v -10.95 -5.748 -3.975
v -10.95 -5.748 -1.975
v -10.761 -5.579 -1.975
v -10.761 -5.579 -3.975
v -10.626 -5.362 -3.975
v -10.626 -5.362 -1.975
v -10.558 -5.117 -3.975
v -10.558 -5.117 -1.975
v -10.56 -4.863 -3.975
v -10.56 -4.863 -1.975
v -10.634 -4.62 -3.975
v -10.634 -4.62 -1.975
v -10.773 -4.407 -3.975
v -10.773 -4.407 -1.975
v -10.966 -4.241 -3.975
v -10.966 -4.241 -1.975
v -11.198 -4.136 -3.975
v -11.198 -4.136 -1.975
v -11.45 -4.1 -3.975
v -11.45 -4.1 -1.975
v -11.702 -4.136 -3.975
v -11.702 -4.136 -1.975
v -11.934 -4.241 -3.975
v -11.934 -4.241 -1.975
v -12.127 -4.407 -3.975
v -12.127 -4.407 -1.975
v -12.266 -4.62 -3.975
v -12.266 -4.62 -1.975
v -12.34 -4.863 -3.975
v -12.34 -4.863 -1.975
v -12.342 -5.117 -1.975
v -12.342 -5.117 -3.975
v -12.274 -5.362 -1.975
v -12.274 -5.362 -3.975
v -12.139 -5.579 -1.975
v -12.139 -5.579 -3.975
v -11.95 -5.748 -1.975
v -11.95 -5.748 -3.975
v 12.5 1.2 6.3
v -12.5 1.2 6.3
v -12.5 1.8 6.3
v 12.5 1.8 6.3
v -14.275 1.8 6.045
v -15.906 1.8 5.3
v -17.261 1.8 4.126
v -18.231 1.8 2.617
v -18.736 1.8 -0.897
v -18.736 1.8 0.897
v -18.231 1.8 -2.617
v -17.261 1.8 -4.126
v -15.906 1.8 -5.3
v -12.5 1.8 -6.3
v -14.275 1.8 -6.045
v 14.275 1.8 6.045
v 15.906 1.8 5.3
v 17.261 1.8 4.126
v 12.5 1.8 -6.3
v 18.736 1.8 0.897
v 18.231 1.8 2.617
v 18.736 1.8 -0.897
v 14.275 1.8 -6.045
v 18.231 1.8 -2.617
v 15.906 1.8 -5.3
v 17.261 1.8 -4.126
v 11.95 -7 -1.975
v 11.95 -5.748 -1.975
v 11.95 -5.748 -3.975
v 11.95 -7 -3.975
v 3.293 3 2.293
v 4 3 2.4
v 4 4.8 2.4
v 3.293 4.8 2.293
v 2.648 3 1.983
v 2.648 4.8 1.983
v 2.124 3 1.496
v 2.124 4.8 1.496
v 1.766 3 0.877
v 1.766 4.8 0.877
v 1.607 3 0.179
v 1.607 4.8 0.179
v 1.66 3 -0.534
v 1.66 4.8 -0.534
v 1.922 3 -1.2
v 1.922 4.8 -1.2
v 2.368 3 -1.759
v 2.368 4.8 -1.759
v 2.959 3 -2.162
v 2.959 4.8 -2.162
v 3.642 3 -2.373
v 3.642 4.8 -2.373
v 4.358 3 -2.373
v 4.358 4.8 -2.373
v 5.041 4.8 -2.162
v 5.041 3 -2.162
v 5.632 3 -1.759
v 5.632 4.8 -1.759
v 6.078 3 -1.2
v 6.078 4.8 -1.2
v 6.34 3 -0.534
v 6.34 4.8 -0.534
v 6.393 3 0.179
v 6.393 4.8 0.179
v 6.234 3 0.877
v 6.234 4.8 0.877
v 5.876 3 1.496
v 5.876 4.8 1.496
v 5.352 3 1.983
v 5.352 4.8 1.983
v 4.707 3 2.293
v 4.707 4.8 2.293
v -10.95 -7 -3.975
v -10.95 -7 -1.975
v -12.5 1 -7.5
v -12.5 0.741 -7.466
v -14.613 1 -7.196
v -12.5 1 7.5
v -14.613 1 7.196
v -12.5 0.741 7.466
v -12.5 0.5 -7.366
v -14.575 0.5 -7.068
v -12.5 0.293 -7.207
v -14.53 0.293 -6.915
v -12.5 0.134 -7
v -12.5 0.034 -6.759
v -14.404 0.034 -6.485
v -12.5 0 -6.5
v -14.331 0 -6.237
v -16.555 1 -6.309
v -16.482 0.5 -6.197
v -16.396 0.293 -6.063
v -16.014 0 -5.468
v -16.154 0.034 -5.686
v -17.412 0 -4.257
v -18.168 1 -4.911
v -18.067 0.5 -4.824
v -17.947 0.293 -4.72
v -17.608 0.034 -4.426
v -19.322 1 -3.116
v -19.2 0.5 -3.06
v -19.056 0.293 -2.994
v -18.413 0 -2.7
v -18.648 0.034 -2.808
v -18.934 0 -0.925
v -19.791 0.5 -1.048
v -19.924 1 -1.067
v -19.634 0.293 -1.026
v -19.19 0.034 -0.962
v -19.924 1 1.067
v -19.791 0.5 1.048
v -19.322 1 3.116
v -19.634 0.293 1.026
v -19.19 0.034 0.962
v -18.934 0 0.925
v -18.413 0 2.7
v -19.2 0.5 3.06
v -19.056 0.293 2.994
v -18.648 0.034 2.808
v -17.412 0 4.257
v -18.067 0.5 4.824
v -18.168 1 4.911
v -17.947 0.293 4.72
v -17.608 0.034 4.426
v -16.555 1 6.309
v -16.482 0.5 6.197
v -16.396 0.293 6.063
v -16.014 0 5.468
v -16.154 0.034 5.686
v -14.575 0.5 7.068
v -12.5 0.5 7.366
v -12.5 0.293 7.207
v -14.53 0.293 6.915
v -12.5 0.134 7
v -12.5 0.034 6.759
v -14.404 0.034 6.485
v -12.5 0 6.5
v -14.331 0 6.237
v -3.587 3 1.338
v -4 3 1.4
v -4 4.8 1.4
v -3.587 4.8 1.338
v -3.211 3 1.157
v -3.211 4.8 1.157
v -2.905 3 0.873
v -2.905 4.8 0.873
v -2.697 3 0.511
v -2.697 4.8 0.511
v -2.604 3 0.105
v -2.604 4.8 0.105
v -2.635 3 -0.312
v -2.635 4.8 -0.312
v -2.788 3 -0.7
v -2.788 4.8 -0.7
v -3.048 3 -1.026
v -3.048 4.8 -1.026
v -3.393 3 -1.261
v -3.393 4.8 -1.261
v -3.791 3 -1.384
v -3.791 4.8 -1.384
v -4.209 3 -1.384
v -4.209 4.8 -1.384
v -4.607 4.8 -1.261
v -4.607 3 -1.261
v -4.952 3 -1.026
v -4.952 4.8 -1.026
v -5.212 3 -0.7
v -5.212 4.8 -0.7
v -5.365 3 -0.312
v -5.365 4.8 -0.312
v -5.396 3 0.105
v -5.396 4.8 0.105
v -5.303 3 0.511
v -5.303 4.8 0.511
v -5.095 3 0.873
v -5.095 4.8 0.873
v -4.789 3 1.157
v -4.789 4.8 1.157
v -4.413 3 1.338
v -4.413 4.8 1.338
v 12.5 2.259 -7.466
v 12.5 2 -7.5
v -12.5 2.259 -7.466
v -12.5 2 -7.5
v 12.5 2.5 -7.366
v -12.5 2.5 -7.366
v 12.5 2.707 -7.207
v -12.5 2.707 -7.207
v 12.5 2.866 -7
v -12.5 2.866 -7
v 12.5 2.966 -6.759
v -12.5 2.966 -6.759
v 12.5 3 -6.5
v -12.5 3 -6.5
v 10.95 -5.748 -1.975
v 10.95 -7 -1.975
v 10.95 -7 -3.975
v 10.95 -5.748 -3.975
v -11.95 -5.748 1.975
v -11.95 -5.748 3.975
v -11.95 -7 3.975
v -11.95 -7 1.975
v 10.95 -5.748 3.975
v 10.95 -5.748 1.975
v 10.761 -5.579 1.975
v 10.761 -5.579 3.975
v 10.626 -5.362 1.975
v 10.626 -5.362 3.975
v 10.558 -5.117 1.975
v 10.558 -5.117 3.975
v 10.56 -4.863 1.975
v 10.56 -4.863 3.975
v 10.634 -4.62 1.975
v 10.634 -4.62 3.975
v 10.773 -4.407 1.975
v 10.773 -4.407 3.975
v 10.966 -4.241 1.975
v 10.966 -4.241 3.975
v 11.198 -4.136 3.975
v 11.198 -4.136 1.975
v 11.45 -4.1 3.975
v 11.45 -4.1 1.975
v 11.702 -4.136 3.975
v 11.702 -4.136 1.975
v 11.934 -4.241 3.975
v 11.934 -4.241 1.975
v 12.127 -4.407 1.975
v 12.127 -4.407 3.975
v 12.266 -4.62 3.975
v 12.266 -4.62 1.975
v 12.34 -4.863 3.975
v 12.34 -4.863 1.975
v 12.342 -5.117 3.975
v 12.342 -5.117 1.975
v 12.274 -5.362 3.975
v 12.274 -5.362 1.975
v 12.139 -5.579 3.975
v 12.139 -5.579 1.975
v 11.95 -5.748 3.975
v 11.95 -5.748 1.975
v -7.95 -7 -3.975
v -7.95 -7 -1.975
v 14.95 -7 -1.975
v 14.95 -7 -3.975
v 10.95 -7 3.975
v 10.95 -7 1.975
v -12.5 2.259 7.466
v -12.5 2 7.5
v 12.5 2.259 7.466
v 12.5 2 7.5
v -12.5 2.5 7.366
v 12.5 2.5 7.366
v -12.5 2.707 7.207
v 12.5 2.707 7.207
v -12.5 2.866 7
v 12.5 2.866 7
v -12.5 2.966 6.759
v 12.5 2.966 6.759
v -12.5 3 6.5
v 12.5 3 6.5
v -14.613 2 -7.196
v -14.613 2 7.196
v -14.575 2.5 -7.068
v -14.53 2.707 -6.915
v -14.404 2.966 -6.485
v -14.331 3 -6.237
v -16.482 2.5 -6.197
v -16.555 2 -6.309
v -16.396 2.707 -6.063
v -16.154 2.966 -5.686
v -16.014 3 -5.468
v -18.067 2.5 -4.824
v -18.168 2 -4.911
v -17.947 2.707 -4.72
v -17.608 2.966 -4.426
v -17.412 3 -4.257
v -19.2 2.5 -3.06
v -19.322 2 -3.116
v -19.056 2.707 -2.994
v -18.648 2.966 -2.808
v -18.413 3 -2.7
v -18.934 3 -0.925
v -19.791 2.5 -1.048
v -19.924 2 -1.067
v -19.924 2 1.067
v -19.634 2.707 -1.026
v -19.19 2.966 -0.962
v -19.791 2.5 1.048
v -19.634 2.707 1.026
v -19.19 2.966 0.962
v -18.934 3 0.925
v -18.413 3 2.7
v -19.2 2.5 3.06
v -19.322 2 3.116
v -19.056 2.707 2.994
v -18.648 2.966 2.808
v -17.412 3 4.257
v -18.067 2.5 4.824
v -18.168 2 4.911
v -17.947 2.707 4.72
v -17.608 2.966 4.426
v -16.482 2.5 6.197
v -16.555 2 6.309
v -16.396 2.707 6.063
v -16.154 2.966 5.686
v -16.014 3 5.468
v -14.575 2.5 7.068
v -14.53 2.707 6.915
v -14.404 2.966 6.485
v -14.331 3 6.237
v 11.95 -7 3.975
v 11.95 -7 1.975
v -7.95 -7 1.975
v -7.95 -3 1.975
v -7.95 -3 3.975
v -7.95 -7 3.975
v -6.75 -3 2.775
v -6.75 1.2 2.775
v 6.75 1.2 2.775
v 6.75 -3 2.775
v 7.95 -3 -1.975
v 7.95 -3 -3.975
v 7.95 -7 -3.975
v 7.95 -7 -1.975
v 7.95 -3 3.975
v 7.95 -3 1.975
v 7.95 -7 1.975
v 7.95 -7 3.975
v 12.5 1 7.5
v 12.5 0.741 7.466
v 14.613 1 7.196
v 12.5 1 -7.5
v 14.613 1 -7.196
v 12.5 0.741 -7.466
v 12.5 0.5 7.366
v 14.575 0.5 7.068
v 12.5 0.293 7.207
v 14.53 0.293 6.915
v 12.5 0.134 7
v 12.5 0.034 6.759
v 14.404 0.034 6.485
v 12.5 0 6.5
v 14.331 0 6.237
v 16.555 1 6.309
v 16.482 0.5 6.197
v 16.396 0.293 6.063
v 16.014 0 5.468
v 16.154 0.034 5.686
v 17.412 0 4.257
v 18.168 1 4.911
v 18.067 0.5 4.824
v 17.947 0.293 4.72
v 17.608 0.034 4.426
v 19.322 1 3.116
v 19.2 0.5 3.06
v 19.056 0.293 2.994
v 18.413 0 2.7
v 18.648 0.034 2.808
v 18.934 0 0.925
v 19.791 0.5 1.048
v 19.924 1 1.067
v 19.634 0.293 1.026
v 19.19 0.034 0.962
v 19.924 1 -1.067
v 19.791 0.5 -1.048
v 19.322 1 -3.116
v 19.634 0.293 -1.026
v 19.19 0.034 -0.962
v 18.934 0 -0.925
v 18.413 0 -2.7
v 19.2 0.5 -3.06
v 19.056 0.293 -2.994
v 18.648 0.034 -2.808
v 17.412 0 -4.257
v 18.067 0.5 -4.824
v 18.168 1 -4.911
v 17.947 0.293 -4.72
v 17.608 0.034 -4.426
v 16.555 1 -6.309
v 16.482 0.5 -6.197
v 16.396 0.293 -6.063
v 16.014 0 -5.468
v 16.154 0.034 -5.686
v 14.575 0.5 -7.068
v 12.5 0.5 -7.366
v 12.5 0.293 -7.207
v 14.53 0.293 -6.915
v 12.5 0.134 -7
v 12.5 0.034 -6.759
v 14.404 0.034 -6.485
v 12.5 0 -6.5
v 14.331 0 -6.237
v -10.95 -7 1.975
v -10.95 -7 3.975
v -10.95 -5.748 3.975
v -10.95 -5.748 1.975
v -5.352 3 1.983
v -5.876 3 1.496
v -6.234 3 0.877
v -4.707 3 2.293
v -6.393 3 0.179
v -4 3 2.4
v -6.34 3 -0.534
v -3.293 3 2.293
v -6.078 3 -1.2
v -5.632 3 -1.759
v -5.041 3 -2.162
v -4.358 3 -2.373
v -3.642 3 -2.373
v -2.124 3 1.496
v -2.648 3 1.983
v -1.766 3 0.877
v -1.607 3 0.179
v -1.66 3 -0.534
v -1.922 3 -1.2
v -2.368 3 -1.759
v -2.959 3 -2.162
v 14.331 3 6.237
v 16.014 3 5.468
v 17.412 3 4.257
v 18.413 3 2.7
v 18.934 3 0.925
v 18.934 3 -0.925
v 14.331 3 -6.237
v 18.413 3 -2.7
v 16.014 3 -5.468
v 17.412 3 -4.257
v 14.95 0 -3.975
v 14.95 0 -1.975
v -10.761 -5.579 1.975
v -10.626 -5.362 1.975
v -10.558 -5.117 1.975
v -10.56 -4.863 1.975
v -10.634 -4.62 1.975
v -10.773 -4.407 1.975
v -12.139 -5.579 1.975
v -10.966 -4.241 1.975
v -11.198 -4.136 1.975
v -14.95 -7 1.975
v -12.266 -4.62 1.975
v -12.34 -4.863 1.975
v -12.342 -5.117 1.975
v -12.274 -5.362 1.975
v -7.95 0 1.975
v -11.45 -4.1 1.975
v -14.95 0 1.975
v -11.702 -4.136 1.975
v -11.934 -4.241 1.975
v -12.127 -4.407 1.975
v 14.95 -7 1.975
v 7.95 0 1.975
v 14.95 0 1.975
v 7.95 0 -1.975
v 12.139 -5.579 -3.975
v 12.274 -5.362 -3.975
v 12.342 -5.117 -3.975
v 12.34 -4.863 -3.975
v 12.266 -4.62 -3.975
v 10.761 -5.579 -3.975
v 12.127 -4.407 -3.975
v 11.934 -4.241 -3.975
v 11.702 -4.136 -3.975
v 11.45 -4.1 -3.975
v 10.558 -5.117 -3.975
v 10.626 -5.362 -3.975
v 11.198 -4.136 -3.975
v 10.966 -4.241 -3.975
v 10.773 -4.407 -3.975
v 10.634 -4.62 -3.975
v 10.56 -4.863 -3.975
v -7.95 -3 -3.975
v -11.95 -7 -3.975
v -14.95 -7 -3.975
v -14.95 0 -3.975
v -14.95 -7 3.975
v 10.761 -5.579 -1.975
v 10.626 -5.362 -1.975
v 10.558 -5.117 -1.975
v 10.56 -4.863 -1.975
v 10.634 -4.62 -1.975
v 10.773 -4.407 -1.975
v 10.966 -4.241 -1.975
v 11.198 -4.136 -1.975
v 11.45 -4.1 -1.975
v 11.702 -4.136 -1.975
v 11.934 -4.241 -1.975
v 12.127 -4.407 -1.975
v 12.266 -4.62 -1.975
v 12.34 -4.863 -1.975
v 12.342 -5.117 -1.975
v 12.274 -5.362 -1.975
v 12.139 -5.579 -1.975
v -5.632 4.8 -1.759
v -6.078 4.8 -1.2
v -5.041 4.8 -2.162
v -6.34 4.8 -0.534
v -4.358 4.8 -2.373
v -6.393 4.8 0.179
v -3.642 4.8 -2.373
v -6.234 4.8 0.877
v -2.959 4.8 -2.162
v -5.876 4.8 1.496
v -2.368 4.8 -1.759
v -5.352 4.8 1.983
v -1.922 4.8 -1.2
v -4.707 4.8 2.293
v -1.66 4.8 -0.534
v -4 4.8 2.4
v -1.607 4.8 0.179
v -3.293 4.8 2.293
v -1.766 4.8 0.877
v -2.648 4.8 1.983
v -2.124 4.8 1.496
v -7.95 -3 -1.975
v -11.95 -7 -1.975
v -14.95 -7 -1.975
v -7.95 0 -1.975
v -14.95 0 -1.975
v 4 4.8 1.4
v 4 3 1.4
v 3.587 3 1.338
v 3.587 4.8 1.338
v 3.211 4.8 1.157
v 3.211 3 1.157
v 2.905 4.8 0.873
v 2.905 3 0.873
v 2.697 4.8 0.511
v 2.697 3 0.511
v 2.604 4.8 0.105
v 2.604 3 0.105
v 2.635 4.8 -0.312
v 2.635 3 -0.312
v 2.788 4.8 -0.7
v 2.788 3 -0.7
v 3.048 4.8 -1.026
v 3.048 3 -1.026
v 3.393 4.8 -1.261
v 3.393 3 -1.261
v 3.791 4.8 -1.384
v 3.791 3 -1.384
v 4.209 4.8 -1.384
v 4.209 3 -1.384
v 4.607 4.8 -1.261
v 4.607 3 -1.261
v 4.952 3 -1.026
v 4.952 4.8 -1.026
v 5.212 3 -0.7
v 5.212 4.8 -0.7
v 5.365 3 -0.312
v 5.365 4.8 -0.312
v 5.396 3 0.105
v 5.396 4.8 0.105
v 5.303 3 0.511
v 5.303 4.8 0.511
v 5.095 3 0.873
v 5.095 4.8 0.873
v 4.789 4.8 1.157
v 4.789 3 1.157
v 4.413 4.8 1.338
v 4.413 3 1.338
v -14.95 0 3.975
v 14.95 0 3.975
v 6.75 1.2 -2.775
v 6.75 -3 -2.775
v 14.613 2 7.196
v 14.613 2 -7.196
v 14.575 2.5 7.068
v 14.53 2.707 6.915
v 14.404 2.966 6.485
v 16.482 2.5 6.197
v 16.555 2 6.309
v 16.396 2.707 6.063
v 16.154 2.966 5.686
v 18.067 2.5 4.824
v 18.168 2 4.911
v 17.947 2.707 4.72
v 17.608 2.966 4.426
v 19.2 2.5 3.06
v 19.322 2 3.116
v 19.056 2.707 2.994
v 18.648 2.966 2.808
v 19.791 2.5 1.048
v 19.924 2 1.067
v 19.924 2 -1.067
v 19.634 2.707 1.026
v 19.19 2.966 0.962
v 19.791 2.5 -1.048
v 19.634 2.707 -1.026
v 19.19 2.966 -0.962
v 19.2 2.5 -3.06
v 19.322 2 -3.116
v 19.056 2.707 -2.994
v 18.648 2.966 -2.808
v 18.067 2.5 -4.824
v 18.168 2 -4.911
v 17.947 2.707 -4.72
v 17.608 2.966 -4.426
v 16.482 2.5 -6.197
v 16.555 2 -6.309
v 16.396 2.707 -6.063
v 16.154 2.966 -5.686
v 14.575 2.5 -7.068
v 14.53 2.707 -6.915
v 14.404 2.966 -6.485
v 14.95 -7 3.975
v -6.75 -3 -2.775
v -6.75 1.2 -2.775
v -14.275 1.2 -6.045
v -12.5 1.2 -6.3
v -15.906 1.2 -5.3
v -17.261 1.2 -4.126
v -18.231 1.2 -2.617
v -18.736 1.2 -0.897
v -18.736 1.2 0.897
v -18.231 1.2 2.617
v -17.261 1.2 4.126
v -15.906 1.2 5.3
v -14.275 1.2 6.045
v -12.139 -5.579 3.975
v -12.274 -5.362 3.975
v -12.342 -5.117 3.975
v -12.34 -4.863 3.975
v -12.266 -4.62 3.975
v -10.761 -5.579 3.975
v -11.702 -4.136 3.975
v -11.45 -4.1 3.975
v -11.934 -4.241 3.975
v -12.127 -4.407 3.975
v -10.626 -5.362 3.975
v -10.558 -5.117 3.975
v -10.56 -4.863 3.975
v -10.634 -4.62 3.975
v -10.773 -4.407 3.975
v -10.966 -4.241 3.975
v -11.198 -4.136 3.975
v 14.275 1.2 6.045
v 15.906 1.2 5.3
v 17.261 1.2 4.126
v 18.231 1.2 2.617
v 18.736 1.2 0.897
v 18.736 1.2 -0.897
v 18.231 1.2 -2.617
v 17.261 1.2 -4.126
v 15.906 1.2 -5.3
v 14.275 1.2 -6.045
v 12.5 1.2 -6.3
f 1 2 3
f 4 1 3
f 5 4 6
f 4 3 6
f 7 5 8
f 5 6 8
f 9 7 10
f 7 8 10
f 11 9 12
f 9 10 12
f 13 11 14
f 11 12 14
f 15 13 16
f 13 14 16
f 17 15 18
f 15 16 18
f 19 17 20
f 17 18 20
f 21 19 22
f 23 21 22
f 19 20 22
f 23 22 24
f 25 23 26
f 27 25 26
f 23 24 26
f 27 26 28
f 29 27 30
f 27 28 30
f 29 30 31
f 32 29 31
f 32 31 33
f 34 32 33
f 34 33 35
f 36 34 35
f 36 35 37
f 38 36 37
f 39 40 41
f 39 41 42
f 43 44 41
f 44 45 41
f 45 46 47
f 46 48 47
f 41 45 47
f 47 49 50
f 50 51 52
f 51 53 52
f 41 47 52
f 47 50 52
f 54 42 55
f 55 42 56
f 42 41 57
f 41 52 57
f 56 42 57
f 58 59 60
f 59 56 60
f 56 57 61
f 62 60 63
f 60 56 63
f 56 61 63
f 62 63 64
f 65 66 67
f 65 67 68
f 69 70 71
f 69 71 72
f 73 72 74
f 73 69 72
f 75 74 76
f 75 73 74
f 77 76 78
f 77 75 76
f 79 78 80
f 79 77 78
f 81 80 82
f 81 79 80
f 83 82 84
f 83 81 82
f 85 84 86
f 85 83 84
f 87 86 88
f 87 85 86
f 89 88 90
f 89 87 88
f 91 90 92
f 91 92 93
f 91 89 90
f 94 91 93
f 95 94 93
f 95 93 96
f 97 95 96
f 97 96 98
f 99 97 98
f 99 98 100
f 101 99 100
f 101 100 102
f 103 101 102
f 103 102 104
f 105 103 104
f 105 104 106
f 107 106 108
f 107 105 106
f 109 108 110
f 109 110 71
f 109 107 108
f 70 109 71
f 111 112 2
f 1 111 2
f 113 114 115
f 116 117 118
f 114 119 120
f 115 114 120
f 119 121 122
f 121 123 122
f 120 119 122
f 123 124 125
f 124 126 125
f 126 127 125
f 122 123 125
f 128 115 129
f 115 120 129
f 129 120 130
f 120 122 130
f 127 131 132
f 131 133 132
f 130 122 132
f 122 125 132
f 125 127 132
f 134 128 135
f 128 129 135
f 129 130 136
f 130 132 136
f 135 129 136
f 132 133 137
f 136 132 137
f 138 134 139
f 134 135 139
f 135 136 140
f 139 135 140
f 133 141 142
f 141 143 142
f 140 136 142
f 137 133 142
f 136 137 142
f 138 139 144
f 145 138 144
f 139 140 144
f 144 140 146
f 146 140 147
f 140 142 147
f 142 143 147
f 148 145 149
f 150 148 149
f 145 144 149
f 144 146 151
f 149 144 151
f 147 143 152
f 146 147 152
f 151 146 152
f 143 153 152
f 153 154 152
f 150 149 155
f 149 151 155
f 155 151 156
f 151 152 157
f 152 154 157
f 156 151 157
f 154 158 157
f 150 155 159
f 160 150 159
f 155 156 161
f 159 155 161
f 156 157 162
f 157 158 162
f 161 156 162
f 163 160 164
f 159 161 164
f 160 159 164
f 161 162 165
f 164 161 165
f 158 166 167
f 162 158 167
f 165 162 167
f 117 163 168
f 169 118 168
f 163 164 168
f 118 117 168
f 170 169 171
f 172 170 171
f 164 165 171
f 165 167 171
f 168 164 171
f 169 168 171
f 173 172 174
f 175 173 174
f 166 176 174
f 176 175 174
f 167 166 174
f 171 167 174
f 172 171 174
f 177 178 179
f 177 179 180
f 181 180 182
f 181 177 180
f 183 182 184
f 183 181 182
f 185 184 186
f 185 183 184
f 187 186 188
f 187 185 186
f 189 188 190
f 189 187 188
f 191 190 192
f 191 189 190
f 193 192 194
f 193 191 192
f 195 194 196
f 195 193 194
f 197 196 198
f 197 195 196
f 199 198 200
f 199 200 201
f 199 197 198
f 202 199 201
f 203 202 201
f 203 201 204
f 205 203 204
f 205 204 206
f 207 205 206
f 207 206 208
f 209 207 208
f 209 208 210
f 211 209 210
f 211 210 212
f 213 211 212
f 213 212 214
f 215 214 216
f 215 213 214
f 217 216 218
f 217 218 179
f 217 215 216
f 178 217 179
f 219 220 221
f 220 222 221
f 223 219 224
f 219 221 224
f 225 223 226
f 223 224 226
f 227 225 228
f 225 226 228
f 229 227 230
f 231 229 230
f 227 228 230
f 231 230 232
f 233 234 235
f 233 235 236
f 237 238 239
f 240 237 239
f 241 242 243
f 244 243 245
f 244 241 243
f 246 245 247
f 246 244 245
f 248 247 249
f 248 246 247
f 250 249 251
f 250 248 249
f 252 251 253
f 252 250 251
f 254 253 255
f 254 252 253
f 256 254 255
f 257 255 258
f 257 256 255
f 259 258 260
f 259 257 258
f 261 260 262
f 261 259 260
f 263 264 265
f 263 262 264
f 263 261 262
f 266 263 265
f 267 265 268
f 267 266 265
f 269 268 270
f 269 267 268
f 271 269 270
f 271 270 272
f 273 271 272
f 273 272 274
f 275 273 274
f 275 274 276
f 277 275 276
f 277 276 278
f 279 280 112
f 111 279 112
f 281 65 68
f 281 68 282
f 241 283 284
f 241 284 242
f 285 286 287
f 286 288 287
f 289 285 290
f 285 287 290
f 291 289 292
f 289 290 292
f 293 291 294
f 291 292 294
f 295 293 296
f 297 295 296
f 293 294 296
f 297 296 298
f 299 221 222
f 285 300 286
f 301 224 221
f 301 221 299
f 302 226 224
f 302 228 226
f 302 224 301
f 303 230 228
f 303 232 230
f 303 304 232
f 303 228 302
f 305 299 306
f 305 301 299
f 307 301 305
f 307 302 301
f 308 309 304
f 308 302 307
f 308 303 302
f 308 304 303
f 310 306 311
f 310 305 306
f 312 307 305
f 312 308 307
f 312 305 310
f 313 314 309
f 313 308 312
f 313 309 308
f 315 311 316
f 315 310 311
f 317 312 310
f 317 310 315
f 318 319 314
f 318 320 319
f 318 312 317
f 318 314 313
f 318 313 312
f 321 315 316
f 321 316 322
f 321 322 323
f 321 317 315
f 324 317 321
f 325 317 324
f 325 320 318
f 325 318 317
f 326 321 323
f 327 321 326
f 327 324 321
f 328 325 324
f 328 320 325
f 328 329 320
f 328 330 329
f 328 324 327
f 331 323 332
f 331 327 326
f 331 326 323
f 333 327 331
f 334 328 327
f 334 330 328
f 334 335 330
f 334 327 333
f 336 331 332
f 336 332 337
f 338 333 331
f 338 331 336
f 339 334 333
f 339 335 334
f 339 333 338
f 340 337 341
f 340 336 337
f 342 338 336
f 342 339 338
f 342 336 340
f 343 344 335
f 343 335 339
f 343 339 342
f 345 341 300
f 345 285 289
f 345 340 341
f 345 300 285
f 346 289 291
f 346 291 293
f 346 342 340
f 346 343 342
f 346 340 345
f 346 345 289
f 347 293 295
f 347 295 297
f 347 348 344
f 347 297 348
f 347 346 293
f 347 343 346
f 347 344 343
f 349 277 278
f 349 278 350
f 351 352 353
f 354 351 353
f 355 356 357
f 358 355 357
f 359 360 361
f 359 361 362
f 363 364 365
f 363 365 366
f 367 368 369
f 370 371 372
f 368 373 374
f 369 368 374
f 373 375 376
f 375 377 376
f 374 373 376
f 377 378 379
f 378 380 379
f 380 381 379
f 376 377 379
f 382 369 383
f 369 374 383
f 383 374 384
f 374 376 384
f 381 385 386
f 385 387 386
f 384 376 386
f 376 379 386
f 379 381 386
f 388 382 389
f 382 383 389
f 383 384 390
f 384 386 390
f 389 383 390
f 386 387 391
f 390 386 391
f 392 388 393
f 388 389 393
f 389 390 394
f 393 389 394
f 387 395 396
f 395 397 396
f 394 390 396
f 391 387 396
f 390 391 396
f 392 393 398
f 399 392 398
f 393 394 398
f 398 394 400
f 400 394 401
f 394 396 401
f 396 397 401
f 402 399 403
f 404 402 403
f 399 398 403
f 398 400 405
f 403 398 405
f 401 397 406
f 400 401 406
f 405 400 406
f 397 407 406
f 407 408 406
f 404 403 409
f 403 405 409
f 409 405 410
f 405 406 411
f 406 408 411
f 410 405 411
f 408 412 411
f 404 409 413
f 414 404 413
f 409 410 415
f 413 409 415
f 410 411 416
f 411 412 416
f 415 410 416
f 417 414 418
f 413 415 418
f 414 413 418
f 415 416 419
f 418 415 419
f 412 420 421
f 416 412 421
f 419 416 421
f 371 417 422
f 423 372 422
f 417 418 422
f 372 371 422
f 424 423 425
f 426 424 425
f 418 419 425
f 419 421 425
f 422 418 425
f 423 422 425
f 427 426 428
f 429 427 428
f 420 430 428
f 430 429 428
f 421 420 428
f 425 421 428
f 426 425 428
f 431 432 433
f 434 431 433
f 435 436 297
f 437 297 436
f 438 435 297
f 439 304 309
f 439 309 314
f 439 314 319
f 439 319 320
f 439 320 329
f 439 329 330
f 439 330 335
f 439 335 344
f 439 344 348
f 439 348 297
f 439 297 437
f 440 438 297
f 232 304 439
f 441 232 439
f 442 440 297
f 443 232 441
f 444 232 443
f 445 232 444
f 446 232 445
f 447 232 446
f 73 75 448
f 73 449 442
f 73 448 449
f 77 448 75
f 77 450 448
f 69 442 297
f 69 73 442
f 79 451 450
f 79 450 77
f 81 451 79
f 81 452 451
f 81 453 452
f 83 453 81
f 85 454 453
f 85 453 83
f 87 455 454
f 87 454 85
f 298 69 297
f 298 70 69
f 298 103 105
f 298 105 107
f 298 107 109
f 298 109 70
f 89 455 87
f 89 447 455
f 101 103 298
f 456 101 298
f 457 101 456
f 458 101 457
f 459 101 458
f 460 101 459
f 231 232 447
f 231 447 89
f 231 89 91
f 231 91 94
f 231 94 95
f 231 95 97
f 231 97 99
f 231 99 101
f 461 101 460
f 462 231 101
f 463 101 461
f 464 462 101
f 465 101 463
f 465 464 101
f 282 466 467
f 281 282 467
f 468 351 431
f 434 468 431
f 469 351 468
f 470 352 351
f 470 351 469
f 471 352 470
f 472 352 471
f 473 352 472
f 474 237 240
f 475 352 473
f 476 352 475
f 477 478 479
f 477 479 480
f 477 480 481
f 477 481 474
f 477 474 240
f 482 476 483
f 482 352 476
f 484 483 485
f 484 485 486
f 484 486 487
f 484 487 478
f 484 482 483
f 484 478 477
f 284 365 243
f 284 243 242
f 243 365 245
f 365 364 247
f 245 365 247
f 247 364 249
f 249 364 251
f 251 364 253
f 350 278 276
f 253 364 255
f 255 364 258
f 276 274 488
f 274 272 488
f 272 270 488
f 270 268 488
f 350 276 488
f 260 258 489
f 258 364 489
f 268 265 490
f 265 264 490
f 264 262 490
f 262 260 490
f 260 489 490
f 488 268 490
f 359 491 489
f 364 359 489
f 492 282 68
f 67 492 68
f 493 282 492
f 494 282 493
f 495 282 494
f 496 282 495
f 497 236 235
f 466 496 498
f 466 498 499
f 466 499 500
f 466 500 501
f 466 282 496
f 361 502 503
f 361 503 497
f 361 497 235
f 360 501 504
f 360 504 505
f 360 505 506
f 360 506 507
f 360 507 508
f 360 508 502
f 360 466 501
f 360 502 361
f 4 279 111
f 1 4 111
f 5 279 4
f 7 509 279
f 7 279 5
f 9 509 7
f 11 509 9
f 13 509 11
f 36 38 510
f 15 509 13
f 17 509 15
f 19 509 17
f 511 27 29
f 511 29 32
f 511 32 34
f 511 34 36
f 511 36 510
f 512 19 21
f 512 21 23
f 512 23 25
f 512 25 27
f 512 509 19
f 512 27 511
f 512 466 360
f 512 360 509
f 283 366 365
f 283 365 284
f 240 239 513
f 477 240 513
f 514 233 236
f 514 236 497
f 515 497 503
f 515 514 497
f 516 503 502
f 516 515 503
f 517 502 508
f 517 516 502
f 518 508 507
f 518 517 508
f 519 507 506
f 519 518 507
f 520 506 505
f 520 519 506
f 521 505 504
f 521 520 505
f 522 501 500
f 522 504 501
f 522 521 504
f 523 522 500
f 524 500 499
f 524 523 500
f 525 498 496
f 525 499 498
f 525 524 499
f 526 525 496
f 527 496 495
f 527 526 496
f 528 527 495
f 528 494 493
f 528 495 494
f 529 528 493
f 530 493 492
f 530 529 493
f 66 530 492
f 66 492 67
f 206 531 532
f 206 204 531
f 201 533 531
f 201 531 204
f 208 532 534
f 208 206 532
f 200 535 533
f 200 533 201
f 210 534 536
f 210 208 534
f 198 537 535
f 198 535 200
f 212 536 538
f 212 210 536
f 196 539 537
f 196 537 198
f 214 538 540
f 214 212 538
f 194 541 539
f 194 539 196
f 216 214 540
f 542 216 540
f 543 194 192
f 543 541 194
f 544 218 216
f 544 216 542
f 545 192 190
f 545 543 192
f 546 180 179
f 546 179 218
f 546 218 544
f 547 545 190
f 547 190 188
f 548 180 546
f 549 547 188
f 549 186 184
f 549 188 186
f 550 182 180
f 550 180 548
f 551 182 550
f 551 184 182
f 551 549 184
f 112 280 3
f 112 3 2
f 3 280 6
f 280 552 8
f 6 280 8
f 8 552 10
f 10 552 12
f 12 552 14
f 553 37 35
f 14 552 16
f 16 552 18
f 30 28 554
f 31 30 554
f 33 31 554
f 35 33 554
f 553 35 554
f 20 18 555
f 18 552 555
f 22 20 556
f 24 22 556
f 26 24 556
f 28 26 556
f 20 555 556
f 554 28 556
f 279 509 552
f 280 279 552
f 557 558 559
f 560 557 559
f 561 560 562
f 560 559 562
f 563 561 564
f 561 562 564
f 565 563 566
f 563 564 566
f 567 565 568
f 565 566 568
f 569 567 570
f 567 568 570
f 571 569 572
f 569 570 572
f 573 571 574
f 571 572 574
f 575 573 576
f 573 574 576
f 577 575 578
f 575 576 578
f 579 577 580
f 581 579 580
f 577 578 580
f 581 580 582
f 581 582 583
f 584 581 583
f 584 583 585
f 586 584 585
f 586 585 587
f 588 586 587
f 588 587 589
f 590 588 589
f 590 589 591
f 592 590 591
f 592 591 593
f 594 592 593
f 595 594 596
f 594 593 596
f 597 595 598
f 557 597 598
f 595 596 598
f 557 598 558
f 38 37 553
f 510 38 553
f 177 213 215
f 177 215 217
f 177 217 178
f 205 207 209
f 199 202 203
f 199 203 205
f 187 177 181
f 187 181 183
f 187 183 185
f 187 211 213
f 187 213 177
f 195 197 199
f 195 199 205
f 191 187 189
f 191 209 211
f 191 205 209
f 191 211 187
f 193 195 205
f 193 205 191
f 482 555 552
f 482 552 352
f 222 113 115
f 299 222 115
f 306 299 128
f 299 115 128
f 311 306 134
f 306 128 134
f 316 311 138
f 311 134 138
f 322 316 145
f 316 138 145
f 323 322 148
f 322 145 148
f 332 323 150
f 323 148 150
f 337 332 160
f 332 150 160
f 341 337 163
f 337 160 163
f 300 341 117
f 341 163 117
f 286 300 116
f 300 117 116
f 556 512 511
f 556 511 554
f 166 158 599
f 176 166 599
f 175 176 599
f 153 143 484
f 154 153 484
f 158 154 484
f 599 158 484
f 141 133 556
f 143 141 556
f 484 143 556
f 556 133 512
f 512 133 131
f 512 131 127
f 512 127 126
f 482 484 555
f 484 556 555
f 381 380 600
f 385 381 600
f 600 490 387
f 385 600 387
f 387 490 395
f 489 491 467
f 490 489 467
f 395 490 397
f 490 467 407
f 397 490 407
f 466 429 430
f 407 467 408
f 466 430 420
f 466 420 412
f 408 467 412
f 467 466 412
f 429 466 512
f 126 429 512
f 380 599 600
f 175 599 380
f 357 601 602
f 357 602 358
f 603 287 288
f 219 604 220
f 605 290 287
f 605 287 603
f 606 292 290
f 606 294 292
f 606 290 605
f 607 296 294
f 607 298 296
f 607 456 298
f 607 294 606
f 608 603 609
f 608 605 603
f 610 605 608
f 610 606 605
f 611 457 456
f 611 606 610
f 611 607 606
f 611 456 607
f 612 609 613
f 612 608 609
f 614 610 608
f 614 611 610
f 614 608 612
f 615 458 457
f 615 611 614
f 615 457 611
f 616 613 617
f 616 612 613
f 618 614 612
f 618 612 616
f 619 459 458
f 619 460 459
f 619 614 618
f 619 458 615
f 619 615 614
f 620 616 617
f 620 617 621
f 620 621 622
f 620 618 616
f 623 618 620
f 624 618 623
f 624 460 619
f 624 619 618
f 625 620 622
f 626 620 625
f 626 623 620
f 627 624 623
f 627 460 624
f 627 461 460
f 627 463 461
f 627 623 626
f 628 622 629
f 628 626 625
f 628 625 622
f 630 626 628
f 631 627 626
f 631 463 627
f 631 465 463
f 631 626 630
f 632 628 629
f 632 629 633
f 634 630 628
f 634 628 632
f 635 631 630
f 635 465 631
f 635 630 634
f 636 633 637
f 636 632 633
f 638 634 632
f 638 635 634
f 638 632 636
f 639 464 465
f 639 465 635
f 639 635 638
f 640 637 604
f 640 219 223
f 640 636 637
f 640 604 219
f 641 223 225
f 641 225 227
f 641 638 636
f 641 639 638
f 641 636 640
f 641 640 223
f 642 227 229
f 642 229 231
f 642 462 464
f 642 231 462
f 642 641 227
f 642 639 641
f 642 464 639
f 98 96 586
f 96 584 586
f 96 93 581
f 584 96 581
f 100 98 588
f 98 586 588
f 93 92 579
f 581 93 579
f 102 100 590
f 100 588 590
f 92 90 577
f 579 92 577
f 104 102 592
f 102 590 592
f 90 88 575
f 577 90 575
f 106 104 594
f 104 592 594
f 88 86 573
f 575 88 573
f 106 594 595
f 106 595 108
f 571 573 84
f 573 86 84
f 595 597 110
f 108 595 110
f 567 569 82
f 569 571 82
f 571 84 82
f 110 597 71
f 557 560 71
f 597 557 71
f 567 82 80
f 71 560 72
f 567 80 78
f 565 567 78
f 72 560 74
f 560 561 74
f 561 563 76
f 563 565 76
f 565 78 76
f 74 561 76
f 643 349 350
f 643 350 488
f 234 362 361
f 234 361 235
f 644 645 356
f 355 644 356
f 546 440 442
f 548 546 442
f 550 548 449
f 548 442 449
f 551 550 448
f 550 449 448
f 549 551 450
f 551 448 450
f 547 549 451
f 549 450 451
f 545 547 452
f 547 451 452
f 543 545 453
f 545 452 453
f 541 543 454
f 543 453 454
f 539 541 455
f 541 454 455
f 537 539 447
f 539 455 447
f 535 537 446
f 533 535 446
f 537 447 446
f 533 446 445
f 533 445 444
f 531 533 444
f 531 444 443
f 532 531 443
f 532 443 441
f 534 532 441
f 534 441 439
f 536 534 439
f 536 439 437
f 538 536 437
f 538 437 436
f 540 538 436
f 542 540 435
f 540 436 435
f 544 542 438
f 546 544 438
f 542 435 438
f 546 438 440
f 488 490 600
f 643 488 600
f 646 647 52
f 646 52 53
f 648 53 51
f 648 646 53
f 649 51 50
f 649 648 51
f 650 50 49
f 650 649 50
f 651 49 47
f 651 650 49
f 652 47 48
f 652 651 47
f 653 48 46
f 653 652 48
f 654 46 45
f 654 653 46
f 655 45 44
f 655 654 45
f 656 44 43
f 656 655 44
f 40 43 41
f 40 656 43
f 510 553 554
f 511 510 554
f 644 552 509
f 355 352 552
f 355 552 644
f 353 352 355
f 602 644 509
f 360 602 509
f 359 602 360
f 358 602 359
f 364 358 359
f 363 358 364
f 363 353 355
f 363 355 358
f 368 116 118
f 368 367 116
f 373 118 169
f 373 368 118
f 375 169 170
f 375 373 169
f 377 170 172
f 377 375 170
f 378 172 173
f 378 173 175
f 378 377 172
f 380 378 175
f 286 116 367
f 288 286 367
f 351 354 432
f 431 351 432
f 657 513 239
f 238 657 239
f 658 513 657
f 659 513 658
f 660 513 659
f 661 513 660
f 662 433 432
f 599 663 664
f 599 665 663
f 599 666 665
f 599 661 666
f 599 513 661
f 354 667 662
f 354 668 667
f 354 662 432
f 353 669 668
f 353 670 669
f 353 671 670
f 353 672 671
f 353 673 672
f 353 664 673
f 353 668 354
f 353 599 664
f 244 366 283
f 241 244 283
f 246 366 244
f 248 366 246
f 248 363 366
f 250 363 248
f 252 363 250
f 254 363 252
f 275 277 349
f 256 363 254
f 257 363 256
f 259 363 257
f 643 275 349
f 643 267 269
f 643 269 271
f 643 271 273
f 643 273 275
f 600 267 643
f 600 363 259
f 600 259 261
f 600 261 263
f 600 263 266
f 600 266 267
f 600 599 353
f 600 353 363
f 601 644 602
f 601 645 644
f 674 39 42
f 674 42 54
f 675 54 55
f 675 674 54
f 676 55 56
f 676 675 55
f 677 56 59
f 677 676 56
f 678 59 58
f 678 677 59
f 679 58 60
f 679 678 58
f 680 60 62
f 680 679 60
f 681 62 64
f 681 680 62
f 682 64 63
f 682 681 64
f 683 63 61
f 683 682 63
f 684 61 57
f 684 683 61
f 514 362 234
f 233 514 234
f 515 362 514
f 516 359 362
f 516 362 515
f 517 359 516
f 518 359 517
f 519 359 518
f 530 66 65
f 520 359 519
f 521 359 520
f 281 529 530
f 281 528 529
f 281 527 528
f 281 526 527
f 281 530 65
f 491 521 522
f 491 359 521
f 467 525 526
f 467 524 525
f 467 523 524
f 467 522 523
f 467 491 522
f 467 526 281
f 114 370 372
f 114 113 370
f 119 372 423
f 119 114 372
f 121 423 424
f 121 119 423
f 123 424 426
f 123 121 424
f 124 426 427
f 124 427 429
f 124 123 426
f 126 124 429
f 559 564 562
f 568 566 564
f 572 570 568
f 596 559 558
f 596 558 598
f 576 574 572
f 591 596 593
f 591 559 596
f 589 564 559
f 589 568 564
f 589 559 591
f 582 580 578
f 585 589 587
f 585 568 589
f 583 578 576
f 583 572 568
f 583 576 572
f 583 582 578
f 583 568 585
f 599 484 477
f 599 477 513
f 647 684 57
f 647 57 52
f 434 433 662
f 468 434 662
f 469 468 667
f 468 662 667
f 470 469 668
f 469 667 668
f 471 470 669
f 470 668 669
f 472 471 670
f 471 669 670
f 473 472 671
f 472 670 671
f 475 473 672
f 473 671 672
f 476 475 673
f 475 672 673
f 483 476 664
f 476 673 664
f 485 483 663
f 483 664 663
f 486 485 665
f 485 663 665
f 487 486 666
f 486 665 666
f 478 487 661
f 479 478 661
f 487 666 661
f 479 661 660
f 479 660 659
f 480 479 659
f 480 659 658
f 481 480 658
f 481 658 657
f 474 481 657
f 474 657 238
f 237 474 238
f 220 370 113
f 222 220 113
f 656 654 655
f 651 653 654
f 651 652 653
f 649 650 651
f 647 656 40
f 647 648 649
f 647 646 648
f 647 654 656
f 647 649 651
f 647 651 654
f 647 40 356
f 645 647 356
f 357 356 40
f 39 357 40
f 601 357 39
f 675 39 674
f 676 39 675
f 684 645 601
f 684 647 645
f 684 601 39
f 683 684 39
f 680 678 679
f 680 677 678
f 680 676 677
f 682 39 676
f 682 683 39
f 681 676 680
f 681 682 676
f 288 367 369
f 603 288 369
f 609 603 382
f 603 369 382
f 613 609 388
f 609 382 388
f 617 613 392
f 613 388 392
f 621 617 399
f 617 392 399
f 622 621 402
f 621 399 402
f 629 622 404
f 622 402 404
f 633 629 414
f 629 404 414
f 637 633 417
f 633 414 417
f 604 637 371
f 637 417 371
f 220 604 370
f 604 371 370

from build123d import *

# Parameters (mm, degrees)
BOSS_EXTRUDE1_DEPTH = 3
FILLET1_R           = 1
SKETCH20_W          = 15.9
SKETCH20_H          = 7.95
BOSS_EXTRUDE2_DEPTH = 3
SHELL1_T            = -1.2
SKETCH21_W          = 7
SKETCH21_H          = 2
BOSS_EXTRUDE4_DEPTH = 7
CUT_EXTRUDE1_DEPTH  = 25.097211976
SKETCH23_R          = 2.4
SKETCH23_R_2        = 1.4
BOSS_EXTRUDE5_DEPTH = 1.8


with BuildPart() as part:
    # Sketch1 → Boss-Extrude1 (new body)
    with BuildSketch(Plane(origin=(0, 0, 0), x_dir=(1, 0, 0), z_dir=(0, 1, 0))):
        with BuildLine():
            Line((-12.5, -7.5), (12.5, -7.5))
            ThreePointArc((12.5, -7.5), (20, 0), (12.5, 7.5))
            Line((12.5, 7.5), (-12.5, 7.5))
            ThreePointArc((-12.5, 7.5), (-20, 0), (-12.5, -7.5))
        make_face()
    extrude(amount=BOSS_EXTRUDE1_DEPTH)

    # Fillet1
    fillet1_edges = [part.edges().sort_by_distance(p)[0] for p in [
        (-20, 3, 0),
        (0, 3, 7.5),
        (20, 3, 0),
        (0, 0, 7.5),
        (-20, 0, 0),
        (0, 0, -7.5),
        (20, 0, 0),
        (0, 3, -7.5),
    ]]
    fillet(fillet1_edges, radius=FILLET1_R)

    # Sketch20 → Boss-Extrude2 (add)
    with BuildSketch(Plane.XZ):
        Rectangle(SKETCH20_W, SKETCH20_H)
    extrude(amount=BOSS_EXTRUDE2_DEPTH)

    # Shell1
    shell1_openings = [part.faces().sort_by_distance(p)[0] for p in [
        (0, -3, 0),
    ]]
    offset(amount=SHELL1_T, openings=shell1_openings, kind=Kind.INTERSECTION)

    # Sketch21 → Boss-Extrude4 (add)
    with BuildSketch(Plane.XZ):
        with Locations((11.45, -2.975)):
            Rectangle(SKETCH21_W, SKETCH21_H)
        with Locations((11.45, 2.975)):
            Rectangle(SKETCH21_W, SKETCH21_H)
    boss_extrude4 = extrude(amount=BOSS_EXTRUDE4_DEPTH)

    # Sketch22 → Cut-Extrude1 (cut, through all)
    with BuildSketch(Plane.XY.offset(3.975)):
        with BuildLine():
            Line((11.95, -7), (10.95, -7))
            Line((10.95, -7), (10.95, -5.748331477))
            ThreePointArc((10.95, -5.748331477), (11.45, -4.1), (11.95, -5.748331477))
            Line((11.95, -5.748331477), (11.95, -7))
        make_face()
    cut_extrude1 = extrude(amount=-CUT_EXTRUDE1_DEPTH, mode=Mode.SUBTRACT)

    # Mirror1: Boss-Extrude4, Cut-Extrude1 across plane
    add(boss_extrude4.mirror(Plane(origin=(0, 0, 0), x_dir=(0, 0, 1), z_dir=(1, 0, 0))))
    add(cut_extrude1.mirror(Plane(origin=(0, 0, 0), x_dir=(0, 0, 1), z_dir=(1, 0, 0))), mode=Mode.SUBTRACT)

    # Sketch23 → Boss-Extrude5 (add)
    with BuildSketch(Plane(origin=(0, 3, 0), x_dir=(1, 0, 0), z_dir=(0, 1, 0))):
        with Locations(Location((-4, 0, 0), (0, 0, 270))):
            Circle(SKETCH23_R)
        with Locations(Location((-4, 0, 0), (0, 0, 270))):
            Circle(SKETCH23_R_2, mode=Mode.SUBTRACT)
    boss_extrude5 = extrude(amount=BOSS_EXTRUDE5_DEPTH)

    # Mirror2: Boss-Extrude5 across plane
    add(boss_extrude5.mirror(Plane(origin=(0, 0, 0), x_dir=(0, 0, 1), z_dir=(1, 0, 0))))


solid = part.part
